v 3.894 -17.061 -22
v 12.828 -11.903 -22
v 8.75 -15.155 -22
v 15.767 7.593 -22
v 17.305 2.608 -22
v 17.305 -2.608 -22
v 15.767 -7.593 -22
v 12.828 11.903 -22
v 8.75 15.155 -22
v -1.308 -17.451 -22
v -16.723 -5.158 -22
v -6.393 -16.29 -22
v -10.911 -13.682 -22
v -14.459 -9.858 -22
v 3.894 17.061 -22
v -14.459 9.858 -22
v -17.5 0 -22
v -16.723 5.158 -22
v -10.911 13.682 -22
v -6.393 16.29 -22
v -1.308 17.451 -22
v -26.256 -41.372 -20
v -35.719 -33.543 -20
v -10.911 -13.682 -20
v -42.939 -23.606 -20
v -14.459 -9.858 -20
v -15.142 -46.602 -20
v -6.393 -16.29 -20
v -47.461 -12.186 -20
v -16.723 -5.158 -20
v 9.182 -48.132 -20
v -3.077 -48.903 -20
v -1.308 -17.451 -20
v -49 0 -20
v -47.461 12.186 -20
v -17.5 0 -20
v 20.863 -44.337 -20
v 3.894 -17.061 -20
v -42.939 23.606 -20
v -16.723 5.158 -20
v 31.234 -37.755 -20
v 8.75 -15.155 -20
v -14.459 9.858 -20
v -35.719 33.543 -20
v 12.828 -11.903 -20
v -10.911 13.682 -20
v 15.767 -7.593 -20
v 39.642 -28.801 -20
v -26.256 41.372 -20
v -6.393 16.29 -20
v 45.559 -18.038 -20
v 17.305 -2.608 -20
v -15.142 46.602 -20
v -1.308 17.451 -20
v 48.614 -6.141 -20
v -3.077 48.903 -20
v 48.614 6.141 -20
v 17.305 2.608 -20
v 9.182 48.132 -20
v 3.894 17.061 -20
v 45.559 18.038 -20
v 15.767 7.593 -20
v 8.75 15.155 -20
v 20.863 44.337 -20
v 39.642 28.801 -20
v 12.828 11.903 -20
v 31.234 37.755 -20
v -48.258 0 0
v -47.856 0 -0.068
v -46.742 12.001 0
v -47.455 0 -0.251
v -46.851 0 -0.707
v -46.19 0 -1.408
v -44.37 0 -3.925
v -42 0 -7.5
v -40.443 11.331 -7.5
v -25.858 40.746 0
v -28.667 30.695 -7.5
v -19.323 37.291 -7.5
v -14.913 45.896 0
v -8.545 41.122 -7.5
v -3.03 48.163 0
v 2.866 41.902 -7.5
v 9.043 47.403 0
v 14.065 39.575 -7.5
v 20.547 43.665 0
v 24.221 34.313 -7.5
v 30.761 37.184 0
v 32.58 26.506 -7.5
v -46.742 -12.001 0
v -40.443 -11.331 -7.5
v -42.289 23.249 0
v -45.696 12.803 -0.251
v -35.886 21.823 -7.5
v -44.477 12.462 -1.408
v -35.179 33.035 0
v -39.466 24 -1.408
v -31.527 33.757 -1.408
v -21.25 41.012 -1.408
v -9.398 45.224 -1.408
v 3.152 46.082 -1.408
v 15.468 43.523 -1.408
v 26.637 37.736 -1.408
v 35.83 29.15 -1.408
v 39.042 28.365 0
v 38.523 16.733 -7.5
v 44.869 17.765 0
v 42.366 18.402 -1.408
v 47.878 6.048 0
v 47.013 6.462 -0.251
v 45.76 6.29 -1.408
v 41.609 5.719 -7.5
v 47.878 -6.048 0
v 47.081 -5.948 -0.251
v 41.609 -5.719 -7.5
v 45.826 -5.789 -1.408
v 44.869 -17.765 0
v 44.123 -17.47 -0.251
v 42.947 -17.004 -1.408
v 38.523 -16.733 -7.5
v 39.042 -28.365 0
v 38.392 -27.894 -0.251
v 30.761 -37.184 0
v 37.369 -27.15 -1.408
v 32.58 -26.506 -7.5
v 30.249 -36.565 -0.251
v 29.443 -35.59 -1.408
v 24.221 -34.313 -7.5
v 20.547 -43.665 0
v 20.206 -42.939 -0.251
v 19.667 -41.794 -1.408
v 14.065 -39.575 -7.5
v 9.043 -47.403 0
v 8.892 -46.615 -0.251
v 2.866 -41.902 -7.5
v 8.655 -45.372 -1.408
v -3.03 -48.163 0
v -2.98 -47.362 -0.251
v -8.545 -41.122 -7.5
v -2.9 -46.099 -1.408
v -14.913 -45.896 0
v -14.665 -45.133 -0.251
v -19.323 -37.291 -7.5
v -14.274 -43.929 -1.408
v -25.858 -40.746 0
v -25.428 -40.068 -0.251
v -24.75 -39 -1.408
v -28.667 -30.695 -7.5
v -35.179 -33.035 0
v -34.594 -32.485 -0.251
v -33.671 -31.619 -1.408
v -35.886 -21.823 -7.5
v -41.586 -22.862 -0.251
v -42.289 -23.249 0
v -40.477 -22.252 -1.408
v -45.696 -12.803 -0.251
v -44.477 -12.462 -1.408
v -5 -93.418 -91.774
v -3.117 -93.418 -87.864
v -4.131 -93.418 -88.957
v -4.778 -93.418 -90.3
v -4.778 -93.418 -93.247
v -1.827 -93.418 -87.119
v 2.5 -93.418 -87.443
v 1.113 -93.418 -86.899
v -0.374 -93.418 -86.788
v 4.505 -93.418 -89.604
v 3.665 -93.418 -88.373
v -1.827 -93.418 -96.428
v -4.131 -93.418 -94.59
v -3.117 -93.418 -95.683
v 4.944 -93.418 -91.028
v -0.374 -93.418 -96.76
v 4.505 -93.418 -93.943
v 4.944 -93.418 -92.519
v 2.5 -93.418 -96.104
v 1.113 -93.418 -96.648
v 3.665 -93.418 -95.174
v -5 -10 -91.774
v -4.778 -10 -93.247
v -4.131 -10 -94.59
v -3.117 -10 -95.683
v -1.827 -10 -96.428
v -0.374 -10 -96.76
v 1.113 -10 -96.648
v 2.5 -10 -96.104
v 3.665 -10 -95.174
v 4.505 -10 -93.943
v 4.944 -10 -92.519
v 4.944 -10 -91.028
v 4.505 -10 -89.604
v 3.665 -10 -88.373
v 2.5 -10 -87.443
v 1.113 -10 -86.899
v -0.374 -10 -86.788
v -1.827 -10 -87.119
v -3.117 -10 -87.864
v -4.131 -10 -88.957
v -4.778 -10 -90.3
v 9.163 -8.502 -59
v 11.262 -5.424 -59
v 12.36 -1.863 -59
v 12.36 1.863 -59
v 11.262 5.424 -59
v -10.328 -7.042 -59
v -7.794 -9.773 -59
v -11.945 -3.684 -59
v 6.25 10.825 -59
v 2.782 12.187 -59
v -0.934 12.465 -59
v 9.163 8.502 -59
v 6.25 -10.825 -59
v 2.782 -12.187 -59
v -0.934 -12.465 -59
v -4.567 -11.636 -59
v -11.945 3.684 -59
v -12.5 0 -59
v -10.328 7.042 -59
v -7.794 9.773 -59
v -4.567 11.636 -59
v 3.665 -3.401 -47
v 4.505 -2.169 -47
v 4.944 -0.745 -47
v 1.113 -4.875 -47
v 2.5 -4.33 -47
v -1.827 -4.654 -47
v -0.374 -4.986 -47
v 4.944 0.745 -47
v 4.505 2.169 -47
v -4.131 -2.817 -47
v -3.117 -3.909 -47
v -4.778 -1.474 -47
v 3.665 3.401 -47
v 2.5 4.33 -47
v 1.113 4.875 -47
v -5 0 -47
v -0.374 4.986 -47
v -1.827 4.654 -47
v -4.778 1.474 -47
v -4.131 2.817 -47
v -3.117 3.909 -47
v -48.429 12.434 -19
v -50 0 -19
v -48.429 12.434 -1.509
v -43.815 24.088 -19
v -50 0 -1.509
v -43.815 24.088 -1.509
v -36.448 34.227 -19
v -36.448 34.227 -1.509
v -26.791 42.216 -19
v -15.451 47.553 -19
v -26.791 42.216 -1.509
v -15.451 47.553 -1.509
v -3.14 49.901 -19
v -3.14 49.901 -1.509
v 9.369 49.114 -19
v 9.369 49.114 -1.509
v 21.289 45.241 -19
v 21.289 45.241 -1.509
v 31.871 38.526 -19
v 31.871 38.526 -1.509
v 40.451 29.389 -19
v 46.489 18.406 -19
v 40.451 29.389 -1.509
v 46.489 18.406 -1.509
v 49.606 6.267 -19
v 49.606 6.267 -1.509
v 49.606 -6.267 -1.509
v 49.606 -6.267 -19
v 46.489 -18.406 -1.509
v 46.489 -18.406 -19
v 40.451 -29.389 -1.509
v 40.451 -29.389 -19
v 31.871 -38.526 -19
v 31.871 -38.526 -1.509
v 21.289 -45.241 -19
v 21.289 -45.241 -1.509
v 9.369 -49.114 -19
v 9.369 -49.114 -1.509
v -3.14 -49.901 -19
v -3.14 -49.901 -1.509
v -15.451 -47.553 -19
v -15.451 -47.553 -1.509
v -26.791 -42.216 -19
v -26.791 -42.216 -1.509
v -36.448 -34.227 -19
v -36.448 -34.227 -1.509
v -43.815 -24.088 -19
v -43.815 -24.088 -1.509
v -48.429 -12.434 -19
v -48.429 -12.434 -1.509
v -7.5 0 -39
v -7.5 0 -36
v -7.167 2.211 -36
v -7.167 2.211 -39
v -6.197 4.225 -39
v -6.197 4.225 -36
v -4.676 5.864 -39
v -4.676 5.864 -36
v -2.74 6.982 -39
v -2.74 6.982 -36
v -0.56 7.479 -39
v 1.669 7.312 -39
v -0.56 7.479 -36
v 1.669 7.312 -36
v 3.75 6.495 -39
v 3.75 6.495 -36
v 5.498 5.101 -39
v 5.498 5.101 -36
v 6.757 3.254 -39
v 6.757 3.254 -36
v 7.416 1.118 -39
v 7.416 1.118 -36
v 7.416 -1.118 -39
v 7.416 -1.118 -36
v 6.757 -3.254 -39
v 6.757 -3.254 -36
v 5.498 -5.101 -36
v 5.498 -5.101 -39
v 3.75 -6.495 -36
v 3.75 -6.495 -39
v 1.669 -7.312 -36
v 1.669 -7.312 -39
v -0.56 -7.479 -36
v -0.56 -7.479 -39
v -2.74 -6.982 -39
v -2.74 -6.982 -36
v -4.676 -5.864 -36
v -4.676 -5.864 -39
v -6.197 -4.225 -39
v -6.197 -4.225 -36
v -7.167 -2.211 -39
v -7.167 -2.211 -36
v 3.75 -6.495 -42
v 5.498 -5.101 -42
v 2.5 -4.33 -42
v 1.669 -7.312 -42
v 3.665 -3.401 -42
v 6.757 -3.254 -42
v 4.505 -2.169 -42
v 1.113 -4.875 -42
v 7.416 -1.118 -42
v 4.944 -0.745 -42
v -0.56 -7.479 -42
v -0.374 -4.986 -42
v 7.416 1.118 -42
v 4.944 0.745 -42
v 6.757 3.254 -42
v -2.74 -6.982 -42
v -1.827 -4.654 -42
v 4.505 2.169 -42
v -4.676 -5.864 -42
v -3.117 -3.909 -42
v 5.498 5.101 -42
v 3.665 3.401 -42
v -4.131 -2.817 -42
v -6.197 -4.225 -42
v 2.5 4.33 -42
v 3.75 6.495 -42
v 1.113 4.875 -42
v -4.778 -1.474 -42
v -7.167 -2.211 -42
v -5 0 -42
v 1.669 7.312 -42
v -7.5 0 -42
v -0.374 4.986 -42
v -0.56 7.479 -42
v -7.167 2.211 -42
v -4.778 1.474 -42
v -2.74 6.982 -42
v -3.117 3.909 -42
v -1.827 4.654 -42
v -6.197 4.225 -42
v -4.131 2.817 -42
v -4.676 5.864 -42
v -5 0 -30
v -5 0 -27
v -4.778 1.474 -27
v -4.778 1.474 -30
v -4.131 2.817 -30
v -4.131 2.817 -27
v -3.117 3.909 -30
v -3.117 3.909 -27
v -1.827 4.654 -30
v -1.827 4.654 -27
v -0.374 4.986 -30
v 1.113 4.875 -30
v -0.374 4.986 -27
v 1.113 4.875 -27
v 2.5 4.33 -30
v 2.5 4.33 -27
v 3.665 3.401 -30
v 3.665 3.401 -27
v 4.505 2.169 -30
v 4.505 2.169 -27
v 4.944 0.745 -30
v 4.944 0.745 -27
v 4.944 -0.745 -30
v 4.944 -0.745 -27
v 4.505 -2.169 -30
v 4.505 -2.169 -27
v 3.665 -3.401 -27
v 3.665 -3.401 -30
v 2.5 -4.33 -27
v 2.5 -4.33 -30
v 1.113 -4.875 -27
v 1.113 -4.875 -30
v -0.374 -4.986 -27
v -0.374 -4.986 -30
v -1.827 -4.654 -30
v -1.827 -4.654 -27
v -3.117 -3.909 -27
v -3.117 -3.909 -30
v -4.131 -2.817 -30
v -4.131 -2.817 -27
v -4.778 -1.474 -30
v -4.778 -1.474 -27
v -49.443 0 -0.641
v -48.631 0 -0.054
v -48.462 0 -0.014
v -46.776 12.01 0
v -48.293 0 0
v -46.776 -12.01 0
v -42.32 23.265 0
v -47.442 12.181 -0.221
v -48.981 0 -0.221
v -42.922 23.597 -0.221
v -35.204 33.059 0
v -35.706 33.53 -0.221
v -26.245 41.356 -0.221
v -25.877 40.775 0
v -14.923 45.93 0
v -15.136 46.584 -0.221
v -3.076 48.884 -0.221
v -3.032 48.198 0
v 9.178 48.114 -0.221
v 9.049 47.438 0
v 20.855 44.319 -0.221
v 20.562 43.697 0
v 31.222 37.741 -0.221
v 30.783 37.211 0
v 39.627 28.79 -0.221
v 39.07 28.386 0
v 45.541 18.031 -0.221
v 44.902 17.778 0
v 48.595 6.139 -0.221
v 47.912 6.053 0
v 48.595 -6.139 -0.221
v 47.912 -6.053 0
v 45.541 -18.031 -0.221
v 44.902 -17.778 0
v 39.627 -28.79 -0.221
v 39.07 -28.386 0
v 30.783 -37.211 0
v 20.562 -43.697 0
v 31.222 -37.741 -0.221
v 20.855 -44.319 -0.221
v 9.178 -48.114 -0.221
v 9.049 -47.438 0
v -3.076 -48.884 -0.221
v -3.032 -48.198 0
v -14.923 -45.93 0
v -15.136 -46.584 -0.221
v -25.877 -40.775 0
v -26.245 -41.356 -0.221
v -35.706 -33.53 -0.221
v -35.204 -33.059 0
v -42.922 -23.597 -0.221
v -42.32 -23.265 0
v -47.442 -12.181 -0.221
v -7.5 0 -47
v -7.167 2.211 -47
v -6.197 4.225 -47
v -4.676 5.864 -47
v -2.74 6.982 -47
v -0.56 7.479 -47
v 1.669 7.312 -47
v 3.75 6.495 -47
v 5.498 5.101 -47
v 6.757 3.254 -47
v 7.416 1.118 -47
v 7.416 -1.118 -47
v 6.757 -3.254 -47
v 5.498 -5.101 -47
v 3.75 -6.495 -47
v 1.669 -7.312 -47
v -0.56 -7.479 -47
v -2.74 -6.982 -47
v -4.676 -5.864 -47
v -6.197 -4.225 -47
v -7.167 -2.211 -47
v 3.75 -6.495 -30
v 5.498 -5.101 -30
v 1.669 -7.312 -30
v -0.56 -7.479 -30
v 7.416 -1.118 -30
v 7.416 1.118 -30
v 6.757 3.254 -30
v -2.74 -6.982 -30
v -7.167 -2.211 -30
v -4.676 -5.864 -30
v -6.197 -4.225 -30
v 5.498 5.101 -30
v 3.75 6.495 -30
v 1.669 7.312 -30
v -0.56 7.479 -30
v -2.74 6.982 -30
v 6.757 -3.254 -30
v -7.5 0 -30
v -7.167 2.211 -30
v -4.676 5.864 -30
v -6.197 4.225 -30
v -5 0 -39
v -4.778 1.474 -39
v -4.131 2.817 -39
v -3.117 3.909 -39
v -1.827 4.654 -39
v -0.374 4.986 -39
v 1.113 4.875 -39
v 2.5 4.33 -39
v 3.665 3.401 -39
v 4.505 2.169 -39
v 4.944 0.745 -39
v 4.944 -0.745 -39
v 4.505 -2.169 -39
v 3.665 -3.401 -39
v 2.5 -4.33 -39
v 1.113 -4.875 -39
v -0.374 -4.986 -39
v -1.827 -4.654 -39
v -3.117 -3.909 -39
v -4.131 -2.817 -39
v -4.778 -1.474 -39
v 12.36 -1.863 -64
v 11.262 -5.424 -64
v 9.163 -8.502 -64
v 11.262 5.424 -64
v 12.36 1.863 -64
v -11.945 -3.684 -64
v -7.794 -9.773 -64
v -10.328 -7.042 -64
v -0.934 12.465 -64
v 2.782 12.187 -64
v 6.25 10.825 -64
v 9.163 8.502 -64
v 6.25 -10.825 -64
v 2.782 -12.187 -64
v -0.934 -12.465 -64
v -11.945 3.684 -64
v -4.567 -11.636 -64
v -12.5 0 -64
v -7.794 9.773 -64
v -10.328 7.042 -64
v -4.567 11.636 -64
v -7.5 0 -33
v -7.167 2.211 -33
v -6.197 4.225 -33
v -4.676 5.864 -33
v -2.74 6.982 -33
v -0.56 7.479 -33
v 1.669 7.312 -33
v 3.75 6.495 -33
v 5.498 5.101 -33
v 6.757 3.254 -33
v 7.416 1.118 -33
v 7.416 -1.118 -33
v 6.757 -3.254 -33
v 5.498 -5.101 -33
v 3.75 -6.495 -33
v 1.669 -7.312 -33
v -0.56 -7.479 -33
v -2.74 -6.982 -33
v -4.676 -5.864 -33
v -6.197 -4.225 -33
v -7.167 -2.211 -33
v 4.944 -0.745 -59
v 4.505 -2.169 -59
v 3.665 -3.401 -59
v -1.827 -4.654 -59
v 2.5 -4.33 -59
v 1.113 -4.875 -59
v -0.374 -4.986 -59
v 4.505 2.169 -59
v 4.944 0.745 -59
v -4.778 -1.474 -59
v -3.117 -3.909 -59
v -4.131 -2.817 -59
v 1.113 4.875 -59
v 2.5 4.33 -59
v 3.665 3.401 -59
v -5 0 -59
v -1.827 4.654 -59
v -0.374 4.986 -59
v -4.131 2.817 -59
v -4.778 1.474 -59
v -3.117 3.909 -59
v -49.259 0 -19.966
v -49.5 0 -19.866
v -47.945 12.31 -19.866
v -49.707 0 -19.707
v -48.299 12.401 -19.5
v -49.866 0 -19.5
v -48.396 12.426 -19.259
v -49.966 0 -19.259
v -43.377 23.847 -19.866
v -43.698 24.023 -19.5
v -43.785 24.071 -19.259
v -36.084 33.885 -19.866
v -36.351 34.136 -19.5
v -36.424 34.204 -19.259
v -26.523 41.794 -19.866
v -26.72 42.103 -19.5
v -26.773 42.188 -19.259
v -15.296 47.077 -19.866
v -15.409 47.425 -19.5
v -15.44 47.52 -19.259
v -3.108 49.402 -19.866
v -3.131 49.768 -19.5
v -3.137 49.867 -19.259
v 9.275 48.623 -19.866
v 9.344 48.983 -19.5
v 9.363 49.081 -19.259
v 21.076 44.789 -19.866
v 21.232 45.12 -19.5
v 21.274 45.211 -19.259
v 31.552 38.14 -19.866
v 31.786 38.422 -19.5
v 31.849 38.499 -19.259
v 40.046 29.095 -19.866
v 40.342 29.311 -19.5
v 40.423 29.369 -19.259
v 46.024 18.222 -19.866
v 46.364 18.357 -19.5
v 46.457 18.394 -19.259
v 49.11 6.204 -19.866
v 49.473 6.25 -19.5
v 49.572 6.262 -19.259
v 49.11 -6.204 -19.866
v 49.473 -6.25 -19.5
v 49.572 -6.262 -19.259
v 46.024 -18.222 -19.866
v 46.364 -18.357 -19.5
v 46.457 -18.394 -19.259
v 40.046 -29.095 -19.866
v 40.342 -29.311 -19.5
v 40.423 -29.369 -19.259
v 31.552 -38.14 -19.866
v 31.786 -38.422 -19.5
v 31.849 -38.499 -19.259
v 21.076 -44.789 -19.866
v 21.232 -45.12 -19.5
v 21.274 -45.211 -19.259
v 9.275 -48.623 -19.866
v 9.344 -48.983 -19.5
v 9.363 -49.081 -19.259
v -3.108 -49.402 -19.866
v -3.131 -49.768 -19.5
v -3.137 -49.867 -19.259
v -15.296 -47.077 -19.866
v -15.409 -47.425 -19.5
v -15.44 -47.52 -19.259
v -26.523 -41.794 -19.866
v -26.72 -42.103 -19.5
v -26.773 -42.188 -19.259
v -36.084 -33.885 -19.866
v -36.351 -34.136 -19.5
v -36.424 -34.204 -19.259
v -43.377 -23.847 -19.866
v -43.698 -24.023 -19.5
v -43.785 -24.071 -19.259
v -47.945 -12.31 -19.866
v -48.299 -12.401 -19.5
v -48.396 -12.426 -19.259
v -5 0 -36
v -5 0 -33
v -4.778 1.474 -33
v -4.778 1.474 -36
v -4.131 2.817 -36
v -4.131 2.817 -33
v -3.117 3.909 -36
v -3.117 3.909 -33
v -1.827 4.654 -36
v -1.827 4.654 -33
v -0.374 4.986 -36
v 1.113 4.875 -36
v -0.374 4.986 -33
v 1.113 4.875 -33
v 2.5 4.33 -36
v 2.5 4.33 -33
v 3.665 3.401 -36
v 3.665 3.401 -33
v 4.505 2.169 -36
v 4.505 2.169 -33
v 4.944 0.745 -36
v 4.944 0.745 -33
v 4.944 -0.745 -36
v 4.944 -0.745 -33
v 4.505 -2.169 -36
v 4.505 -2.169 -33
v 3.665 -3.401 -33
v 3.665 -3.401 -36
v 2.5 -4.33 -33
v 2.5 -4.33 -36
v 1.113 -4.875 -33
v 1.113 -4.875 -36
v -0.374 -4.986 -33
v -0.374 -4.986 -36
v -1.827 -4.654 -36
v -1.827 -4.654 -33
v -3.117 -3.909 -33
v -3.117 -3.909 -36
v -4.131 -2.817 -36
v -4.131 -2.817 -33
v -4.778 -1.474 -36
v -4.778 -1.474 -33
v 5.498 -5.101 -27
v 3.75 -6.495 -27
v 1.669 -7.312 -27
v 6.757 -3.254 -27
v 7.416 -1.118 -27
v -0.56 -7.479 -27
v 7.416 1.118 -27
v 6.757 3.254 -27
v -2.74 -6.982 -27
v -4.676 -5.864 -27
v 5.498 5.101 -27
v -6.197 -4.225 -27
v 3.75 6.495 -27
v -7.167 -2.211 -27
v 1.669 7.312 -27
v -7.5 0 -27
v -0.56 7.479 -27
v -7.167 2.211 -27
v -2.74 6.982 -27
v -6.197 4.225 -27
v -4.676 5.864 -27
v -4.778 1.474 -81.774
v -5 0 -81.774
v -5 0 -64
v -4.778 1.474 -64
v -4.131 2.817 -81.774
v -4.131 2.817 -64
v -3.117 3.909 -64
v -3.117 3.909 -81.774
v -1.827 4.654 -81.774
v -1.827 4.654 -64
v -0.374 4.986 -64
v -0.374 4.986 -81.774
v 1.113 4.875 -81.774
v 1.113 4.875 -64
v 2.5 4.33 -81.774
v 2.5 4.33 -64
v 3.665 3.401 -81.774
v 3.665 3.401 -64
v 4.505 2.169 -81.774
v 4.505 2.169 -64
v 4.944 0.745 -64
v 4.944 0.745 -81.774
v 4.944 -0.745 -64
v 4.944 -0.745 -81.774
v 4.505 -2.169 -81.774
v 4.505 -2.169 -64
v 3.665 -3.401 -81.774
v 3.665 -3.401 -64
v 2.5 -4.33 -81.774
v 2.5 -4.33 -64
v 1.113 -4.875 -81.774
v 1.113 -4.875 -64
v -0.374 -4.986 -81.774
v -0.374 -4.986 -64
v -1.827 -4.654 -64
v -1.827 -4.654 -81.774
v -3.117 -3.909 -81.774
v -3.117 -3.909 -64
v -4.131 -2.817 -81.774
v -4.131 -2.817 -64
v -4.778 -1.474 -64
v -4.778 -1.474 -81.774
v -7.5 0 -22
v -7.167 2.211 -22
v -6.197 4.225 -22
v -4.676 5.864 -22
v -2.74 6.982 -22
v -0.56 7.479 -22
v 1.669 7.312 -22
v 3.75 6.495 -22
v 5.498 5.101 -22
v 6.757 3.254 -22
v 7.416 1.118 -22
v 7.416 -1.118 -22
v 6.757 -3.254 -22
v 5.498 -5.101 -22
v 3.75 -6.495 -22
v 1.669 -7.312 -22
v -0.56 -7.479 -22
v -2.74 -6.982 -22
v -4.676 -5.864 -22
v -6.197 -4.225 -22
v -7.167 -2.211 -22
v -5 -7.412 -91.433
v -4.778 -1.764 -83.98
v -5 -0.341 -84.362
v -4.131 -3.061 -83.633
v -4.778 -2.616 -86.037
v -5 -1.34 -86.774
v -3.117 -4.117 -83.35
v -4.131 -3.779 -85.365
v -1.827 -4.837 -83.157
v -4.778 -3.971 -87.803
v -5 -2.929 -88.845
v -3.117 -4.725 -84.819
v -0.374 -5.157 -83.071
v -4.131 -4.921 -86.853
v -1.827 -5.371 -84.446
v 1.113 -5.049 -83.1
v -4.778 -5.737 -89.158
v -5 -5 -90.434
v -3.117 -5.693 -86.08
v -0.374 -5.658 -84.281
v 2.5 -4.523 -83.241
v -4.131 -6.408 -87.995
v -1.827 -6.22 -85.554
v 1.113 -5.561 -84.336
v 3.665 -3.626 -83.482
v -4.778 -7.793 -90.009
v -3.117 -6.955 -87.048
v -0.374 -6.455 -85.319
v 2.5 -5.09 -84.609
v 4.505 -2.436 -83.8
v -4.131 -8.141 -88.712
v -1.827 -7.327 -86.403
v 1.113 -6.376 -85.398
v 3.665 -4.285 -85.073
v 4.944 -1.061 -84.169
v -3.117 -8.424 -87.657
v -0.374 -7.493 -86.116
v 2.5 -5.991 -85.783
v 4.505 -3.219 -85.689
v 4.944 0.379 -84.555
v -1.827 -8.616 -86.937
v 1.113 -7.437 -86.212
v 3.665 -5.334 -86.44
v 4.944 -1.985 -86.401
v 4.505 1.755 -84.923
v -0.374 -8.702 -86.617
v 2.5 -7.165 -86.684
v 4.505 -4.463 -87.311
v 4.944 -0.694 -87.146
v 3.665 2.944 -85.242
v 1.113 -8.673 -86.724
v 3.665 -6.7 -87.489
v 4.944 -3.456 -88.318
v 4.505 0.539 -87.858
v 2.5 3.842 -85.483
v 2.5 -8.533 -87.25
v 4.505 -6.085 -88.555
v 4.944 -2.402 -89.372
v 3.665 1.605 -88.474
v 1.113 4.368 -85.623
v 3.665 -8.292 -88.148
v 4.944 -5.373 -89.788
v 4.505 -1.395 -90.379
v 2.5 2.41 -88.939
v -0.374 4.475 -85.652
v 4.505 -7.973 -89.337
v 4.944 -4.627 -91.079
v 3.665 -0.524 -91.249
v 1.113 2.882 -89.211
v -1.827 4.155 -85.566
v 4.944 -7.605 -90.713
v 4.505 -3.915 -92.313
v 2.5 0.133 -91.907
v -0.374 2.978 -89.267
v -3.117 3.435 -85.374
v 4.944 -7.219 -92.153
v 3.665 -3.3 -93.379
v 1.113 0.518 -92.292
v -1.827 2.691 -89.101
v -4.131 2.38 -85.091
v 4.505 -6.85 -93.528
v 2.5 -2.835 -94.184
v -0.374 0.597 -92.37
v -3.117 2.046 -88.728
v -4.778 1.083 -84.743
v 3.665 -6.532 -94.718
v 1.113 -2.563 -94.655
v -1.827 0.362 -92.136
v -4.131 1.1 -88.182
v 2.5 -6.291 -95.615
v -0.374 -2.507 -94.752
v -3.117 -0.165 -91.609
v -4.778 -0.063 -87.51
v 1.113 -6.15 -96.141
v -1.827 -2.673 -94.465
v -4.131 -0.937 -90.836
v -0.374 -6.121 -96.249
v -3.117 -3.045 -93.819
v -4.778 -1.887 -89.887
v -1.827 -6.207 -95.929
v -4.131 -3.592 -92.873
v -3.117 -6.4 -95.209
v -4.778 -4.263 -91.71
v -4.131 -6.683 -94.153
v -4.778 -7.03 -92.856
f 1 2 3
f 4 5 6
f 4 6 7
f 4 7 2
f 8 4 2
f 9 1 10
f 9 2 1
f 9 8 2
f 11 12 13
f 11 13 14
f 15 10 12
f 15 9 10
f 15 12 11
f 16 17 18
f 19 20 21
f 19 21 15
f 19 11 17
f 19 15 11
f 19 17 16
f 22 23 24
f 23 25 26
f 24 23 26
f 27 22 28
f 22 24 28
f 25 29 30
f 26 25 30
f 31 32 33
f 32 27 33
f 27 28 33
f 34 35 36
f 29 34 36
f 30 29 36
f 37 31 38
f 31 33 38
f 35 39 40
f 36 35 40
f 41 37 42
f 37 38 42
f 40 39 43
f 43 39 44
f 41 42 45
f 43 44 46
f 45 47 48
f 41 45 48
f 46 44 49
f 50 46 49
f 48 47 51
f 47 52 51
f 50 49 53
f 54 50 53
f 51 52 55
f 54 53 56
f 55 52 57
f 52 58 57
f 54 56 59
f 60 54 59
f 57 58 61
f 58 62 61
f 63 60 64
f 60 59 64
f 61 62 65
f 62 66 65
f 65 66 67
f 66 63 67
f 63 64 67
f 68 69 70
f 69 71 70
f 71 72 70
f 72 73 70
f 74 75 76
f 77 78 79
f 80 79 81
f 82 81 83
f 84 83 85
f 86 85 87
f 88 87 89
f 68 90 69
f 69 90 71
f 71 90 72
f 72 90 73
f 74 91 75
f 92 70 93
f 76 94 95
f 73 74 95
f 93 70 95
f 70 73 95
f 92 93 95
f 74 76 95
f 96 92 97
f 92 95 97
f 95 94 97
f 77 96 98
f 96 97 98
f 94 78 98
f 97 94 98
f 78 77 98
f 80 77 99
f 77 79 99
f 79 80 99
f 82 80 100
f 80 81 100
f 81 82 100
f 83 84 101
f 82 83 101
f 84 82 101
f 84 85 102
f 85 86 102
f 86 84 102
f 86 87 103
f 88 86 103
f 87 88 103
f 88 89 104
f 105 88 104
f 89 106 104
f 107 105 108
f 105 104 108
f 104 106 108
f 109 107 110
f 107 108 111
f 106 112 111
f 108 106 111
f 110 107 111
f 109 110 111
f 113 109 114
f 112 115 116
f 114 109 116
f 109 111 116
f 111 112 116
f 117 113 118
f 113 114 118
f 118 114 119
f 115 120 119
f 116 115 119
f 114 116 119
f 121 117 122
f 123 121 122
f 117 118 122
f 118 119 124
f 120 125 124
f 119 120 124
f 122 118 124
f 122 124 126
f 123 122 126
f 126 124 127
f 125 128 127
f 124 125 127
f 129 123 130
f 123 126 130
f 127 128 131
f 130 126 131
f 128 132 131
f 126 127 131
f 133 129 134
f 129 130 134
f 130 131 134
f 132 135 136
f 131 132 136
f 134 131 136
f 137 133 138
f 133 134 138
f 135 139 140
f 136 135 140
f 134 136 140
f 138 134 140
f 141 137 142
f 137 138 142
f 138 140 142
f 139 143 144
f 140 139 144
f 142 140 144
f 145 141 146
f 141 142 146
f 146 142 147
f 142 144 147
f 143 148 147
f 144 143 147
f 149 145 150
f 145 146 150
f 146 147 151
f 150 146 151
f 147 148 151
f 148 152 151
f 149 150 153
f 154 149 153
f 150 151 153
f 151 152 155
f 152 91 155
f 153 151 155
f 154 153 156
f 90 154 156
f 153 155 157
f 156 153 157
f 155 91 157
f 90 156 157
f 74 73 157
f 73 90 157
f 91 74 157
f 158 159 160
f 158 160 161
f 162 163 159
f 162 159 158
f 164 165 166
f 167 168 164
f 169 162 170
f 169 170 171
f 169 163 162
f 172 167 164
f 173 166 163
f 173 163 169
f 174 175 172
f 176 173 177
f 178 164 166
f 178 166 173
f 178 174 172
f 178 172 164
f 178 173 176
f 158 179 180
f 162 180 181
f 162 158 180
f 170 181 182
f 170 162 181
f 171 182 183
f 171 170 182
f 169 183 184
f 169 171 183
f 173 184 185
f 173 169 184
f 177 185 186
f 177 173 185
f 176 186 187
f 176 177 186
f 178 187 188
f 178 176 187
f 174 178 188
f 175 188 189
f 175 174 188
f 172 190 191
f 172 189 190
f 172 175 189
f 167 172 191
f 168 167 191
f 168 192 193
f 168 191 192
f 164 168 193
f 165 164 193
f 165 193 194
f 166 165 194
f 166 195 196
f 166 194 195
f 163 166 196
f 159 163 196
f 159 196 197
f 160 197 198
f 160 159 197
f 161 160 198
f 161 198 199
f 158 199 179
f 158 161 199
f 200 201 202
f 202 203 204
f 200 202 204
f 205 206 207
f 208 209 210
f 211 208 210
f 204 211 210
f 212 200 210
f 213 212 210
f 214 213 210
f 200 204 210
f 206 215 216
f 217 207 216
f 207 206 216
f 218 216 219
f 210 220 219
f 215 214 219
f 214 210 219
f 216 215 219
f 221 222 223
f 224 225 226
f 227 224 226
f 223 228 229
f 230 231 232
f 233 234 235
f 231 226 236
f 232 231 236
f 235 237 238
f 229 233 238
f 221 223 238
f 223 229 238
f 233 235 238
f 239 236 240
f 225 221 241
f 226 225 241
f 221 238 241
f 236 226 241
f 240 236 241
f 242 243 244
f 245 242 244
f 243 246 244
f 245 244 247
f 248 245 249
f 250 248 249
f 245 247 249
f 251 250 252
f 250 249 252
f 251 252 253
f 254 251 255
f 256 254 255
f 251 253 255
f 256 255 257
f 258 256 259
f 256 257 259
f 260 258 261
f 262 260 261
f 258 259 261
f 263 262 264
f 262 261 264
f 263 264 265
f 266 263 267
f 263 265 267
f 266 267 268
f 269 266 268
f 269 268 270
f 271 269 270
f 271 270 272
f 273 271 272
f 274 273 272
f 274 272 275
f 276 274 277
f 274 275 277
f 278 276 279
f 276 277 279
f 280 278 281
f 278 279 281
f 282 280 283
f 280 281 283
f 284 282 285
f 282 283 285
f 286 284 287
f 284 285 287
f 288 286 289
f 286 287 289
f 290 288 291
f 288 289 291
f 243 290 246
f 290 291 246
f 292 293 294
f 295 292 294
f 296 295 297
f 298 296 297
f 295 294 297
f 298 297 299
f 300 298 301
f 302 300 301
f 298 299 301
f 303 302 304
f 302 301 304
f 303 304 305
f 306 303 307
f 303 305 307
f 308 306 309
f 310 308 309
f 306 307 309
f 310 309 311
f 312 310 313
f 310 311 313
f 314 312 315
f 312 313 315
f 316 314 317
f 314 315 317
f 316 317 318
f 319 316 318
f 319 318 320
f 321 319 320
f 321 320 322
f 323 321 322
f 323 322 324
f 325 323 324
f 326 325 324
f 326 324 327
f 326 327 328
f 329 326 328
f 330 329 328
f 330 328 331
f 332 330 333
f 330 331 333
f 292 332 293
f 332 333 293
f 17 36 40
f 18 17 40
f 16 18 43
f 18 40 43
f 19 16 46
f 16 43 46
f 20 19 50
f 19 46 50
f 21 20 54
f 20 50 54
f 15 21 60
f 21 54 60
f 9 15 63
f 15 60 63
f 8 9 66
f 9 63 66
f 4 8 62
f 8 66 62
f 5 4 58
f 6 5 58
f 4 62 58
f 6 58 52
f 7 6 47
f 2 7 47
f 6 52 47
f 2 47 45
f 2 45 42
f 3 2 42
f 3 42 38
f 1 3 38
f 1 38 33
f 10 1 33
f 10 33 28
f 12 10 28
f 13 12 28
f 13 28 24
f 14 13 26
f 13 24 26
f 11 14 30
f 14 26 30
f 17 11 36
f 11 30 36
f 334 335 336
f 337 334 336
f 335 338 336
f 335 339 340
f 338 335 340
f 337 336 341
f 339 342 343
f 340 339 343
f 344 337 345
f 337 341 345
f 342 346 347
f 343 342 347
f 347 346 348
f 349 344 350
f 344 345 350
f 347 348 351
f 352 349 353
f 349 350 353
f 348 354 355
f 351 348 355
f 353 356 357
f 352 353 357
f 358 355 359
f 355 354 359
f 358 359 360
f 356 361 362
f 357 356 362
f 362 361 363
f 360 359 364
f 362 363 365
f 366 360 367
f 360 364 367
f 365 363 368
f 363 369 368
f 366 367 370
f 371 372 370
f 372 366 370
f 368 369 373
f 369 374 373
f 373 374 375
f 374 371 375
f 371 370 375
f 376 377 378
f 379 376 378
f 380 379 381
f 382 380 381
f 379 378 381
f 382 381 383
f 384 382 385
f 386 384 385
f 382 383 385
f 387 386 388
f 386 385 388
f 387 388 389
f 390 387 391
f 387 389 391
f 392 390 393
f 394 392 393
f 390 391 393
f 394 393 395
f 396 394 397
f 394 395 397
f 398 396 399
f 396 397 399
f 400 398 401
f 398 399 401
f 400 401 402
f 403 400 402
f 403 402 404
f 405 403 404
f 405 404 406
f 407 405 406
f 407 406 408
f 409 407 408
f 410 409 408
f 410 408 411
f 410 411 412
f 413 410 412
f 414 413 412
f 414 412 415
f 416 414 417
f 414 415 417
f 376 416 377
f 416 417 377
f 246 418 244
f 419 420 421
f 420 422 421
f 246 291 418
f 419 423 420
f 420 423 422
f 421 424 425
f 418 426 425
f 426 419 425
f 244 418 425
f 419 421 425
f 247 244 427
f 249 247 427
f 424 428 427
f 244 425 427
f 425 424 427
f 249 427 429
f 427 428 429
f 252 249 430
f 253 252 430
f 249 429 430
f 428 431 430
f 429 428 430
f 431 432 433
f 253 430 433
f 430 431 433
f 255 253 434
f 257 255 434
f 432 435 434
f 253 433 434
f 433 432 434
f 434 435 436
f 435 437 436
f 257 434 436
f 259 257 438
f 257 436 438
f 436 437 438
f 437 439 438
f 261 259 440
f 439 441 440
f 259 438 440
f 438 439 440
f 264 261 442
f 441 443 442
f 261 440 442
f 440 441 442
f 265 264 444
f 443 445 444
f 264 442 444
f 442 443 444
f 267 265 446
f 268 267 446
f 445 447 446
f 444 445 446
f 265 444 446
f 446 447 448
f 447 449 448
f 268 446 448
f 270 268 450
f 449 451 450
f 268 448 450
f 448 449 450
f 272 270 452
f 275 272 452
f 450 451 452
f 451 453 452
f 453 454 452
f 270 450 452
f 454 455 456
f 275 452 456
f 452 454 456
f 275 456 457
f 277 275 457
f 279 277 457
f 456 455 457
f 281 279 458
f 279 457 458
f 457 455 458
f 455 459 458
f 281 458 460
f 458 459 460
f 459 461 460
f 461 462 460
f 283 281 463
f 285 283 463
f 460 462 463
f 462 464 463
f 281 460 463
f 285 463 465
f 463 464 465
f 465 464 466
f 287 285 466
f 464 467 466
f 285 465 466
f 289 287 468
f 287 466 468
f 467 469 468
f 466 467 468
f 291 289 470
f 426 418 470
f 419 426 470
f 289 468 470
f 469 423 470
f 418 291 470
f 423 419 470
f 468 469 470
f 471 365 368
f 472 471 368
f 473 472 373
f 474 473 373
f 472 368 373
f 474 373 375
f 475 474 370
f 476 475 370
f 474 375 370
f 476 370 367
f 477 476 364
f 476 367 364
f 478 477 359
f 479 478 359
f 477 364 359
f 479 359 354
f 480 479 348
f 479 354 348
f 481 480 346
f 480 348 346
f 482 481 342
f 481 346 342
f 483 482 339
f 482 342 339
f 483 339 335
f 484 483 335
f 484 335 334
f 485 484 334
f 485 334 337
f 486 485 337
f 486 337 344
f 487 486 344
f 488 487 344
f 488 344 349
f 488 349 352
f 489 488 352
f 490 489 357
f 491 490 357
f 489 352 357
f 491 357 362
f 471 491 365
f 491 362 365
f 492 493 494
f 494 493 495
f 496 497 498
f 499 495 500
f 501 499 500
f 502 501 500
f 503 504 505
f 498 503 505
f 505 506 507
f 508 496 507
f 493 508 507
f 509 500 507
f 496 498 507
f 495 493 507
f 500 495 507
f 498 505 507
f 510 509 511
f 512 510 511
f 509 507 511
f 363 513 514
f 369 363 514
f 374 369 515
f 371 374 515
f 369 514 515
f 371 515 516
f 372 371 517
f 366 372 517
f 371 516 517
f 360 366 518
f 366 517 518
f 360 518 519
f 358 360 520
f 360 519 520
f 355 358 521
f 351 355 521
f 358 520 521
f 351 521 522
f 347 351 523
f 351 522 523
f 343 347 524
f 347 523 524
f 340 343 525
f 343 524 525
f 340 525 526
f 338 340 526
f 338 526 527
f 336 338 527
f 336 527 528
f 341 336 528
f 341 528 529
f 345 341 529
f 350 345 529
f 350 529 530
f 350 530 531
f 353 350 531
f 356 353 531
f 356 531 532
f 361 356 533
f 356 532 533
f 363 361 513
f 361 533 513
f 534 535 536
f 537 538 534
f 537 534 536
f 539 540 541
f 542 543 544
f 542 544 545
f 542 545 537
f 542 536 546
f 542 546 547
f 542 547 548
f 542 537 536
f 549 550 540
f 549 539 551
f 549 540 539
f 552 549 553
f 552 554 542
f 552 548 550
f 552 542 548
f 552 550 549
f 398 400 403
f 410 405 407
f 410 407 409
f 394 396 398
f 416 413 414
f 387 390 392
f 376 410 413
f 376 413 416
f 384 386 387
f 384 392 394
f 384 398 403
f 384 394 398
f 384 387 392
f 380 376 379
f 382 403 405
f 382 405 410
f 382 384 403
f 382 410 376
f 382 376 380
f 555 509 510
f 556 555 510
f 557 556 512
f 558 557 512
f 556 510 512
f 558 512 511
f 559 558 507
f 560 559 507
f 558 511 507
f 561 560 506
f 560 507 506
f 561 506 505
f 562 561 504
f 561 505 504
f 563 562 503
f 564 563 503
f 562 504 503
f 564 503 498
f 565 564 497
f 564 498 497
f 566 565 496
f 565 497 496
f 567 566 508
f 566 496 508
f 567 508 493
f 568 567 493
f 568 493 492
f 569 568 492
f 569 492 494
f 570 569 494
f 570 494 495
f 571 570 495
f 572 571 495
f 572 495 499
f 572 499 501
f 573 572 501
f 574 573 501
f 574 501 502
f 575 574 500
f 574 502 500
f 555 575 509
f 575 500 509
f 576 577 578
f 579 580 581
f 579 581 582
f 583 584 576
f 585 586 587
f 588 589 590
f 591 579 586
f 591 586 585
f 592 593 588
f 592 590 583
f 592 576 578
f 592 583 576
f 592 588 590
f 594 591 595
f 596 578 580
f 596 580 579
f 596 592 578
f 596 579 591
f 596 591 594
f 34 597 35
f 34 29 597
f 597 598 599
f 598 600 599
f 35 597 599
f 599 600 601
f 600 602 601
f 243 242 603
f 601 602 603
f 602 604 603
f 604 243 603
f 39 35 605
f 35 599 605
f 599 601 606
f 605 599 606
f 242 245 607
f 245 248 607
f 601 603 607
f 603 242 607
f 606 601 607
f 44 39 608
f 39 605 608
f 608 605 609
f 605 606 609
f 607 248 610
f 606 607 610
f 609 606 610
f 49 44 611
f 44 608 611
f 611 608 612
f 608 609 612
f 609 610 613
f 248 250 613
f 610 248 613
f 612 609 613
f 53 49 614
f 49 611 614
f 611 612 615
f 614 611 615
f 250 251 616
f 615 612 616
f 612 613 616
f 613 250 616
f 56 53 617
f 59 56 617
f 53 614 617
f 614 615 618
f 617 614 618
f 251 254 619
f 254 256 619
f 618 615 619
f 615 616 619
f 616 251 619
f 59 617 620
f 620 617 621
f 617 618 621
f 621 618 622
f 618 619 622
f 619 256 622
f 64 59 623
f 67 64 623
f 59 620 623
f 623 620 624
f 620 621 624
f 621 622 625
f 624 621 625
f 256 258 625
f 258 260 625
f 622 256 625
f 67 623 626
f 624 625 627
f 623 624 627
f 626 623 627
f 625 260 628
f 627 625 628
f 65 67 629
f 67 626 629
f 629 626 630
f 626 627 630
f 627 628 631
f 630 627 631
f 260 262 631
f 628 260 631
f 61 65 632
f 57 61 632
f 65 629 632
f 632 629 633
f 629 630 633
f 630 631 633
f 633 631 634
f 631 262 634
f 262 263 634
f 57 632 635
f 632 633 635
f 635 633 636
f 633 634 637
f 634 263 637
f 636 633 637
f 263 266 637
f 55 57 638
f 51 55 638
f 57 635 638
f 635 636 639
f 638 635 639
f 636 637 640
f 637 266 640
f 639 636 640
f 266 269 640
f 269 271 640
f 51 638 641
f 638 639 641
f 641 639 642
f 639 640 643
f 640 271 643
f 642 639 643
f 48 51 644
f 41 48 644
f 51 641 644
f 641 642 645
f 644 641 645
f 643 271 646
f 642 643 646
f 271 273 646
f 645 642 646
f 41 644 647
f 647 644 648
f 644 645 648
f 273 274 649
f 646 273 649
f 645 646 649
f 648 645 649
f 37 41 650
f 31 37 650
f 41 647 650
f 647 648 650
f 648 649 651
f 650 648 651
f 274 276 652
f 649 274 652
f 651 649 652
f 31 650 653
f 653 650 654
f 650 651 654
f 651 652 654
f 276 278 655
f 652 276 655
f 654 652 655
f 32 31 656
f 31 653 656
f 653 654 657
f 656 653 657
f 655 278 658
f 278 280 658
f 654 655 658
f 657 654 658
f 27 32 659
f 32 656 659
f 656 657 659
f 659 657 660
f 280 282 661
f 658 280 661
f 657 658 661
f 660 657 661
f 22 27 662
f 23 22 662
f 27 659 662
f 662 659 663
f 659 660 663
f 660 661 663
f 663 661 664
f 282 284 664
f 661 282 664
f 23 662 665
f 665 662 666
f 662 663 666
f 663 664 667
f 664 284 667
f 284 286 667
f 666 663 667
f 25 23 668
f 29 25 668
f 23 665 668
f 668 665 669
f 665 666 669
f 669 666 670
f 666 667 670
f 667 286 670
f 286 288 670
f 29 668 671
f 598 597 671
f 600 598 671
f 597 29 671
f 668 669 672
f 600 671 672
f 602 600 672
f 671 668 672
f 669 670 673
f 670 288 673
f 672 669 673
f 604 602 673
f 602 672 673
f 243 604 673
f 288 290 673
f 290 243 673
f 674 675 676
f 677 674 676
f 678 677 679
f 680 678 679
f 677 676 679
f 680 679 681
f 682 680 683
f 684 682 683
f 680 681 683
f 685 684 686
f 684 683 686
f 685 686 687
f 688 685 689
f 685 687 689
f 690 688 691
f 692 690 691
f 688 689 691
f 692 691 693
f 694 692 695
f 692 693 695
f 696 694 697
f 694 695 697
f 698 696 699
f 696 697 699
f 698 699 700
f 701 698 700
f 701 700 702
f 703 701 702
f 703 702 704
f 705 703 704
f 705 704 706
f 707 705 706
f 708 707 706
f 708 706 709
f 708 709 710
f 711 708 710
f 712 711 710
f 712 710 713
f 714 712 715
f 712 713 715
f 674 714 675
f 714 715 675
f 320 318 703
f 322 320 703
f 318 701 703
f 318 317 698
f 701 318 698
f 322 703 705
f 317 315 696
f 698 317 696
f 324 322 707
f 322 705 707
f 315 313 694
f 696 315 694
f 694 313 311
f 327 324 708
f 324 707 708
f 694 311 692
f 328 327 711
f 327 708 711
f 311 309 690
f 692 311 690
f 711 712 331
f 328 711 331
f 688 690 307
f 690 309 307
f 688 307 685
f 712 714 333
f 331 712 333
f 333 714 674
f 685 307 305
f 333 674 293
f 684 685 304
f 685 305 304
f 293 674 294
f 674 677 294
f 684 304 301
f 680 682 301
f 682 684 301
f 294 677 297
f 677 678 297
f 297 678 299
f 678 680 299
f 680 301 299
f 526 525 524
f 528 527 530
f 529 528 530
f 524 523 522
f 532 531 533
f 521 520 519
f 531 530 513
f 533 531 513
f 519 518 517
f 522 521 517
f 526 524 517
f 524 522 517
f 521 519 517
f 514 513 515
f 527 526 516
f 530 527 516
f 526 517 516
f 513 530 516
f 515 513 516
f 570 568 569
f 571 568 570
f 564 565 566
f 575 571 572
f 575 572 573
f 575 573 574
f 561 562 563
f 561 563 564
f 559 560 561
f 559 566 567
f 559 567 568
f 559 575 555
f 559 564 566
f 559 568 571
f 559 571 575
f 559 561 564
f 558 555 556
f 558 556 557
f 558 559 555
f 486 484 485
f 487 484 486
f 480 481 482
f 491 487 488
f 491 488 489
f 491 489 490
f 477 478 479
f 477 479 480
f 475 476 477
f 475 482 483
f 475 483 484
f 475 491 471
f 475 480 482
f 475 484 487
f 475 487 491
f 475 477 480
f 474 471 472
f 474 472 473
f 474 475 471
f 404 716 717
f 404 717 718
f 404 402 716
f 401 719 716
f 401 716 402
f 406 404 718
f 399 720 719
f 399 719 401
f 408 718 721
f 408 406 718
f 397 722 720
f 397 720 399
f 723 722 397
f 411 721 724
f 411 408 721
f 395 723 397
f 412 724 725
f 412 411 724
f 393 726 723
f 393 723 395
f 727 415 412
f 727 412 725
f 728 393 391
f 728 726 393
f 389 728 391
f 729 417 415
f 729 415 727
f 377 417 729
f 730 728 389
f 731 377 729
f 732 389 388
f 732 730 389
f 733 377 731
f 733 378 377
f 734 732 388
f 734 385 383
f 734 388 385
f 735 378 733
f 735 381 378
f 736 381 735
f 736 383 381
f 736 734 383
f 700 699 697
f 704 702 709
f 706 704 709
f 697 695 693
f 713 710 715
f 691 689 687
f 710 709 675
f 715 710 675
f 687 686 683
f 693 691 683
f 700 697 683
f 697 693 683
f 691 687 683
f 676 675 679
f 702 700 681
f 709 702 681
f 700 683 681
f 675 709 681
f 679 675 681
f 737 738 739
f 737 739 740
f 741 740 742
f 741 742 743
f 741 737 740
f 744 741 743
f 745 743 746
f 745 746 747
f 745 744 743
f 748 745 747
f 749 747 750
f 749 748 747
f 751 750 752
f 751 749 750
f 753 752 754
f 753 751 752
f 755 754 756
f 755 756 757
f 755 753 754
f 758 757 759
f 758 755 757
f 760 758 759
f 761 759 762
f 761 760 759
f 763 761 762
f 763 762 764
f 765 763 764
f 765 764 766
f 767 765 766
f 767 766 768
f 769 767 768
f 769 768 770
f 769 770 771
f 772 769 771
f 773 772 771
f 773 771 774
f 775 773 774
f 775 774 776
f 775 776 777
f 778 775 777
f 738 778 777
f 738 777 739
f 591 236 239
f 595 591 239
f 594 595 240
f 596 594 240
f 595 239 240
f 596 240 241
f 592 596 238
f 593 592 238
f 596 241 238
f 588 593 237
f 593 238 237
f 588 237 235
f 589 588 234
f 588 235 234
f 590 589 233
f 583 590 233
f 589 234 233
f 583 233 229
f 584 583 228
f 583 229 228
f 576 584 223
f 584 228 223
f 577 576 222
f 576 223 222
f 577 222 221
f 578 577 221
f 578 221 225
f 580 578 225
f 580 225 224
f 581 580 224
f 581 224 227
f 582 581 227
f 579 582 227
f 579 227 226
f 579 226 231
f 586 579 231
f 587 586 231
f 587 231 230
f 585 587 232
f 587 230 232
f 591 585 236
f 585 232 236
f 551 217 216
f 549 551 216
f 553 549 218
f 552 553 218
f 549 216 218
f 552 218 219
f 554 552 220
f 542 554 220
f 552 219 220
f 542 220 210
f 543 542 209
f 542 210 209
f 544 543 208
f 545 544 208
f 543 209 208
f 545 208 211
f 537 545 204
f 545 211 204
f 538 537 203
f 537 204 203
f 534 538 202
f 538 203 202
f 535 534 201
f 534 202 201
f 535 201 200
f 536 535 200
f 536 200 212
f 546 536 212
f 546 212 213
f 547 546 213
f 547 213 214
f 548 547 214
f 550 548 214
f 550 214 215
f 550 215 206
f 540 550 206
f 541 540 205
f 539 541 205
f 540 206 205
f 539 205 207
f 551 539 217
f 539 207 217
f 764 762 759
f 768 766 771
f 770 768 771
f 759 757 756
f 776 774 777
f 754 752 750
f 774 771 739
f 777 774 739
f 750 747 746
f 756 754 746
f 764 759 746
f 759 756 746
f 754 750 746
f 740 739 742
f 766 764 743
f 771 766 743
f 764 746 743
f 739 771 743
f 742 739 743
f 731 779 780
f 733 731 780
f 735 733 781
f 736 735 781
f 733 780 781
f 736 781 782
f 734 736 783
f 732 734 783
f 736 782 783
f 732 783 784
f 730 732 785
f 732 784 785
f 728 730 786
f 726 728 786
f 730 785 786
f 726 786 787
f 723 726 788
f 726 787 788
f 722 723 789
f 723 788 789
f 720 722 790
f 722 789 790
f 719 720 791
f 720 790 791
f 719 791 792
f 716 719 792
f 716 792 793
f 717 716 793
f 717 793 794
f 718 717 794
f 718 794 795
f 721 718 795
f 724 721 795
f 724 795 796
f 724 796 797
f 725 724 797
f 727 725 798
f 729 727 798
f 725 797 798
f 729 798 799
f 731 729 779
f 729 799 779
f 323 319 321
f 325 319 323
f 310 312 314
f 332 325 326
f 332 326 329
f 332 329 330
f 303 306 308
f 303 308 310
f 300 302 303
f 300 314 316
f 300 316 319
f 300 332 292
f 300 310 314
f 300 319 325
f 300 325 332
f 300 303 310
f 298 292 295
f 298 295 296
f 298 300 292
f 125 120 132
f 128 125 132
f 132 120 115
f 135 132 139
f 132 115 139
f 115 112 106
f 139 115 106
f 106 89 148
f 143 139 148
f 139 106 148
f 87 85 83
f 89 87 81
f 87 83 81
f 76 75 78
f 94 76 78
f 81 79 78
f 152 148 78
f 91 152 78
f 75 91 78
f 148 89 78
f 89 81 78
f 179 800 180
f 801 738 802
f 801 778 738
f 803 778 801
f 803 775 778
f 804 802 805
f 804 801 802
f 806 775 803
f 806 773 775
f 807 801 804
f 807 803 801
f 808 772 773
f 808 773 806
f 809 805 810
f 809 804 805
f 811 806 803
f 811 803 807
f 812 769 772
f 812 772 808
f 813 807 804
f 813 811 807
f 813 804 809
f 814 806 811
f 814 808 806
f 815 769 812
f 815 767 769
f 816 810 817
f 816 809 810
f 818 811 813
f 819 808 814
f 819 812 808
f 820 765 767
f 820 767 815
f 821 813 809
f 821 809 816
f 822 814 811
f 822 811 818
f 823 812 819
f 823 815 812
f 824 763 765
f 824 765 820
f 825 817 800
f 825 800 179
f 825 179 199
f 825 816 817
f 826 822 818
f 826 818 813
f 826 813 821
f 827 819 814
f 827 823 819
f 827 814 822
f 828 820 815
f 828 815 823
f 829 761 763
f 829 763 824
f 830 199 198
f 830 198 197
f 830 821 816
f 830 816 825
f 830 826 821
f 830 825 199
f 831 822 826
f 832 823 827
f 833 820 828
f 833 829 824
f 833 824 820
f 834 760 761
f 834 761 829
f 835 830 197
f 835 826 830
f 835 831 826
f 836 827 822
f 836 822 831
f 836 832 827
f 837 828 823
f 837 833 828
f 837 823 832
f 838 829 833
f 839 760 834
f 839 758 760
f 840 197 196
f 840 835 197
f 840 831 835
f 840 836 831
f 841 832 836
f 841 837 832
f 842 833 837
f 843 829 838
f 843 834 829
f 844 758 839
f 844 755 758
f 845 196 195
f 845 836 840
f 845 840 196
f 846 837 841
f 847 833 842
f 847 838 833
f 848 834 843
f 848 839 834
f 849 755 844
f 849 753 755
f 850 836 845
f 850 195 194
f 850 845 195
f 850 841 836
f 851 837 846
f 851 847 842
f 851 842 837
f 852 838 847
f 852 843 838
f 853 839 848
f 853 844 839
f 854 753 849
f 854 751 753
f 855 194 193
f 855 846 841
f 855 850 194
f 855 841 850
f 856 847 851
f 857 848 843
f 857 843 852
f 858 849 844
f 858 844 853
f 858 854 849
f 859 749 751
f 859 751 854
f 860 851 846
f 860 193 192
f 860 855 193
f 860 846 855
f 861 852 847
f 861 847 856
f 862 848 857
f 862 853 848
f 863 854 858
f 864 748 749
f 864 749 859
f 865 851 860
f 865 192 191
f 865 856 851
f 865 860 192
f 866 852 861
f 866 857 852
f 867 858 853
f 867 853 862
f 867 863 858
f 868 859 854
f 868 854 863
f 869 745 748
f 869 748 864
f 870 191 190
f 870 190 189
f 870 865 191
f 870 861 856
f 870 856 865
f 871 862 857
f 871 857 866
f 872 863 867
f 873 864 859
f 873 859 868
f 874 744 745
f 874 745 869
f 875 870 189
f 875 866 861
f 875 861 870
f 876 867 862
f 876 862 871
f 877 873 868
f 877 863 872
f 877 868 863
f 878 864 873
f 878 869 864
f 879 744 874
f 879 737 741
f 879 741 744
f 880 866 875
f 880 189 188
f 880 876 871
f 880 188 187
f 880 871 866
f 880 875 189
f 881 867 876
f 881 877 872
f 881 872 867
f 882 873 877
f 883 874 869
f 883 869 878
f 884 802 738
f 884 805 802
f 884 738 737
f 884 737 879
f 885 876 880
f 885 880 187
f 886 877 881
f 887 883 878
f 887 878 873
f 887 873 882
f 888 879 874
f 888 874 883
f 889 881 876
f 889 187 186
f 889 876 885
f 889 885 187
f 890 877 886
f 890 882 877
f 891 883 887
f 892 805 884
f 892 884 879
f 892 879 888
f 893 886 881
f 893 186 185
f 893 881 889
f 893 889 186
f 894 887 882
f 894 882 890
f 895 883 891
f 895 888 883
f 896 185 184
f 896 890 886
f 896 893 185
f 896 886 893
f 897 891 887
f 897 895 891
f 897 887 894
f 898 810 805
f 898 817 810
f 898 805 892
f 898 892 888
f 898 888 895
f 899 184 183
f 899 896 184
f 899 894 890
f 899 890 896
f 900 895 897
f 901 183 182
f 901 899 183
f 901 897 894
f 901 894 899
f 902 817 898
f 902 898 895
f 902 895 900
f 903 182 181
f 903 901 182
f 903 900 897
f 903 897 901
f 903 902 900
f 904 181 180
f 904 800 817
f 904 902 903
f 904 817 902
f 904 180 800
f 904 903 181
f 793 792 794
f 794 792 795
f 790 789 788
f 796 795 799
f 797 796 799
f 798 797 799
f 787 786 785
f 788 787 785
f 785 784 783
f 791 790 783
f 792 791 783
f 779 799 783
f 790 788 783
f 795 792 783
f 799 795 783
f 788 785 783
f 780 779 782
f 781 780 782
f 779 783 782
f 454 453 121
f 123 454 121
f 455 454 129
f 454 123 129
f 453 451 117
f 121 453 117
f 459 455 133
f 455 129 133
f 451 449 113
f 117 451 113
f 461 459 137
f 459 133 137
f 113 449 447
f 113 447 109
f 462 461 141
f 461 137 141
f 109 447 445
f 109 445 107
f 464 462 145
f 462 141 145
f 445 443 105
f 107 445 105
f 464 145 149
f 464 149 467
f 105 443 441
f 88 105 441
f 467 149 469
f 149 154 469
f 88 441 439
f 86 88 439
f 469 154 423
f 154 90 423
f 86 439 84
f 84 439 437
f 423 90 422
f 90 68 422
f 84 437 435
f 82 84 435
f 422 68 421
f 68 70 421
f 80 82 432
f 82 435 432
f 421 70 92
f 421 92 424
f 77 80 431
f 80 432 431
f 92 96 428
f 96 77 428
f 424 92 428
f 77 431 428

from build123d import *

# Parameters (mm, degrees)
SKETCH2_R            = 17.5
BOSS_EXTRUDE1_DEPTH  = 2
SKETCH4_R            = 7.5
BOSS_EXTRUDE2_DEPTH  = 5
SKETCH5_R            = 5
BOSS_EXTRUDE3_DEPTH  = 3
SKETCH6_R            = 7.5
BOSS_EXTRUDE4_DEPTH  = 3
SKETCH7_R            = 5
BOSS_EXTRUDE5_DEPTH  = 3
SKETCH8_R            = 7.5
BOSS_EXTRUDE6_DEPTH  = 3
SKETCH9_R            = 5
BOSS_EXTRUDE7_DEPTH  = 3
SKETCH10_R           = 7.5
BOSS_EXTRUDE8_DEPTH  = 5
SKETCH11_R           = 5
BOSS_EXTRUDE9_DEPTH  = 12
SKETCH12_R           = 12.5
BOSS_EXTRUDE10_DEPTH = 5
SKETCH13_R           = 5
BOSS_EXTRUDE11_DEPTH = 150
SKETCH15_W           = 126.965595496
SKETCH15_H           = 152.993542573
CUT_EXTRUDE1_DEPTH   = 84
SKETCH16_R           = 5


with BuildPart() as part:
    # Sketch1 → Revolve1 (revolve)
    with BuildSketch(Plane(origin=(0, 0, 0), x_dir=(0, 0, -1), z_dir=(1, 0, 0)), mode=Mode.PRIVATE) as revolve1_sk:
        with BuildLine():
            Line((7.5, 42), (7.5, 0))
            Line((7.5, 0), (20, 0))
            Line((20, 0), (20, 49))
            ThreePointArc((20, 49), (19.707106781, 49.707106781), (19, 50))
            Line((19, 50), (1.508773395, 50))
            add(Edge.make_bspline(
                [(1.508773395, 50), (0.432324338, 49.451358887), (0.008310505, 48.873891546), (0, 48.293227533)],
                knots=[0, 0, 0, 0, 0.135349479, 0.135349479, 0.135349479, 0.135349479], degree=3))
            Line((0, 48.293227533), (0, 48.258265787))
            add(Edge.make_bspline(
                [(0, 48.258265787), (0.016256181, 47.11783752), (3.565780066, 44.566166731), (6.093568686, 42.91770881), (7.5, 42)],
                knots=[0.138065657, 0.138065657, 0.138065657, 0.138065657, 0.403839001, 0.727380334, 0.727380334, 0.727380334, 0.727380334], degree=3))
        make_face()
    revolve(revolve1_sk.sketch.rotate(Axis((0, 0, 0), (0, 0, -1)), 270), axis=Axis((0, 0, 0), (0, 0, -1)))

    # Sketch2 → Boss-Extrude1 (add)
    with BuildSketch(Plane(origin=(0, 0, -20), x_dir=(-1, 0, 0), z_dir=(0, 0, -1))):
        Circle(SKETCH2_R)
    extrude(amount=BOSS_EXTRUDE1_DEPTH)


with BuildPart() as body_2:
    # Sketch4 → Boss-Extrude2 (new body)
    with BuildSketch(Plane(origin=(0, 0, -22), x_dir=(-1, 0, 0), z_dir=(0, 0, -1))):
        Circle(SKETCH4_R)
    extrude(amount=BOSS_EXTRUDE2_DEPTH)

    # Sketch5 → Boss-Extrude3 (add)
    with BuildSketch(Plane(origin=(0, 0, -27), x_dir=(-1, 0, 0), z_dir=(0, 0, -1))):
        Circle(SKETCH5_R)
    extrude(amount=BOSS_EXTRUDE3_DEPTH)


with BuildPart() as body_3:
    # Sketch6 → Boss-Extrude4 (new body)
    with BuildSketch(Plane(origin=(0, 0, -30), x_dir=(-1, 0, 0), z_dir=(0, 0, -1))):
        Circle(SKETCH6_R)
    extrude(amount=BOSS_EXTRUDE4_DEPTH)


with BuildPart() as body_4:
    # Sketch7 → Boss-Extrude5 (new body)
    with BuildSketch(Plane(origin=(0, 0, -33), x_dir=(-1, 0, 0), z_dir=(0, 0, -1))):
        Circle(SKETCH7_R)
    extrude(amount=BOSS_EXTRUDE5_DEPTH)

    # Sketch8 → Boss-Extrude6 (add)
    with BuildSketch(Plane(origin=(0, 0, -36), x_dir=(-1, 0, 0), z_dir=(0, 0, -1))):
        Circle(SKETCH8_R)
    extrude(amount=BOSS_EXTRUDE6_DEPTH)


with BuildPart() as body_5:
    # Sketch9 → Boss-Extrude7 (new body)
    with BuildSketch(Plane(origin=(0, 0, -39), x_dir=(-1, 0, 0), z_dir=(0, 0, -1))):
        Circle(SKETCH9_R)
    extrude(amount=BOSS_EXTRUDE7_DEPTH)

    # Sketch10 → Boss-Extrude8 (add)
    with BuildSketch(Plane(origin=(0, 0, -42), x_dir=(-1, 0, 0), z_dir=(0, 0, -1))):
        Circle(SKETCH10_R)
    extrude(amount=BOSS_EXTRUDE8_DEPTH)


with BuildPart() as body_6:
    # Sketch11 → Boss-Extrude9 (new body)
    with BuildSketch(Plane(origin=(0, 0, -47), x_dir=(-1, 0, 0), z_dir=(0, 0, -1))):
        Circle(SKETCH11_R)
    extrude(amount=BOSS_EXTRUDE9_DEPTH)


with BuildPart() as body_7:
    # Sketch12 → Boss-Extrude10 (new body)
    with BuildSketch(Plane(origin=(0, 0, -59), x_dir=(-1, 0, 0), z_dir=(0, 0, -1))):
        Circle(SKETCH12_R)
    extrude(amount=BOSS_EXTRUDE10_DEPTH)


with BuildPart() as body_8:
    # Sketch13 → Boss-Extrude11 (new body)
    with BuildSketch(Plane(origin=(0, 0, -64), x_dir=(-1, 0, 0), z_dir=(0, 0, -1))):
        Circle(SKETCH13_R)
    extrude(amount=BOSS_EXTRUDE11_DEPTH)

    # Sketch15 → Cut-Extrude1 (cut, symmetric)
    with BuildSketch(Plane(origin=(0, 0, 0), x_dir=(1, 0, 0), z_dir=(0, 1, 0))):
        with Locations((-3.174139887, 154.9295123)):
            Rectangle(SKETCH15_W, SKETCH15_H)
    extrude(amount=CUT_EXTRUDE1_DEPTH, both=True, mode=Mode.SUBTRACT)

    # Sweep1: sweep along a path in Sketch17
    with BuildLine(Plane(origin=(0, 0, 0), x_dir=(0, 0, -1), z_dir=(1, 0, 0))) as sweep1_path:
        Line((78.432741013, 0), (81.773609231, 0))
        ThreePointArc((81.773609231, 0), (88.844677043, -2.928932188), (91.773609231, -10))
        Line((91.773609231, -10), (91.773609231, -93.417748551))
    # Sketch16 → Sweep1 (sweep)
    with BuildSketch(Plane(origin=(0, 0, -78.432741013), x_dir=(-1, 0, 0), z_dir=(0, 0, -1))):
        Circle(SKETCH16_R)
    sweep(path=sweep1_path.line)


solid = Compound([part.part, body_2.part, body_3.part, body_4.part, body_5.part, body_6.part, body_7.part, body_8.part])
